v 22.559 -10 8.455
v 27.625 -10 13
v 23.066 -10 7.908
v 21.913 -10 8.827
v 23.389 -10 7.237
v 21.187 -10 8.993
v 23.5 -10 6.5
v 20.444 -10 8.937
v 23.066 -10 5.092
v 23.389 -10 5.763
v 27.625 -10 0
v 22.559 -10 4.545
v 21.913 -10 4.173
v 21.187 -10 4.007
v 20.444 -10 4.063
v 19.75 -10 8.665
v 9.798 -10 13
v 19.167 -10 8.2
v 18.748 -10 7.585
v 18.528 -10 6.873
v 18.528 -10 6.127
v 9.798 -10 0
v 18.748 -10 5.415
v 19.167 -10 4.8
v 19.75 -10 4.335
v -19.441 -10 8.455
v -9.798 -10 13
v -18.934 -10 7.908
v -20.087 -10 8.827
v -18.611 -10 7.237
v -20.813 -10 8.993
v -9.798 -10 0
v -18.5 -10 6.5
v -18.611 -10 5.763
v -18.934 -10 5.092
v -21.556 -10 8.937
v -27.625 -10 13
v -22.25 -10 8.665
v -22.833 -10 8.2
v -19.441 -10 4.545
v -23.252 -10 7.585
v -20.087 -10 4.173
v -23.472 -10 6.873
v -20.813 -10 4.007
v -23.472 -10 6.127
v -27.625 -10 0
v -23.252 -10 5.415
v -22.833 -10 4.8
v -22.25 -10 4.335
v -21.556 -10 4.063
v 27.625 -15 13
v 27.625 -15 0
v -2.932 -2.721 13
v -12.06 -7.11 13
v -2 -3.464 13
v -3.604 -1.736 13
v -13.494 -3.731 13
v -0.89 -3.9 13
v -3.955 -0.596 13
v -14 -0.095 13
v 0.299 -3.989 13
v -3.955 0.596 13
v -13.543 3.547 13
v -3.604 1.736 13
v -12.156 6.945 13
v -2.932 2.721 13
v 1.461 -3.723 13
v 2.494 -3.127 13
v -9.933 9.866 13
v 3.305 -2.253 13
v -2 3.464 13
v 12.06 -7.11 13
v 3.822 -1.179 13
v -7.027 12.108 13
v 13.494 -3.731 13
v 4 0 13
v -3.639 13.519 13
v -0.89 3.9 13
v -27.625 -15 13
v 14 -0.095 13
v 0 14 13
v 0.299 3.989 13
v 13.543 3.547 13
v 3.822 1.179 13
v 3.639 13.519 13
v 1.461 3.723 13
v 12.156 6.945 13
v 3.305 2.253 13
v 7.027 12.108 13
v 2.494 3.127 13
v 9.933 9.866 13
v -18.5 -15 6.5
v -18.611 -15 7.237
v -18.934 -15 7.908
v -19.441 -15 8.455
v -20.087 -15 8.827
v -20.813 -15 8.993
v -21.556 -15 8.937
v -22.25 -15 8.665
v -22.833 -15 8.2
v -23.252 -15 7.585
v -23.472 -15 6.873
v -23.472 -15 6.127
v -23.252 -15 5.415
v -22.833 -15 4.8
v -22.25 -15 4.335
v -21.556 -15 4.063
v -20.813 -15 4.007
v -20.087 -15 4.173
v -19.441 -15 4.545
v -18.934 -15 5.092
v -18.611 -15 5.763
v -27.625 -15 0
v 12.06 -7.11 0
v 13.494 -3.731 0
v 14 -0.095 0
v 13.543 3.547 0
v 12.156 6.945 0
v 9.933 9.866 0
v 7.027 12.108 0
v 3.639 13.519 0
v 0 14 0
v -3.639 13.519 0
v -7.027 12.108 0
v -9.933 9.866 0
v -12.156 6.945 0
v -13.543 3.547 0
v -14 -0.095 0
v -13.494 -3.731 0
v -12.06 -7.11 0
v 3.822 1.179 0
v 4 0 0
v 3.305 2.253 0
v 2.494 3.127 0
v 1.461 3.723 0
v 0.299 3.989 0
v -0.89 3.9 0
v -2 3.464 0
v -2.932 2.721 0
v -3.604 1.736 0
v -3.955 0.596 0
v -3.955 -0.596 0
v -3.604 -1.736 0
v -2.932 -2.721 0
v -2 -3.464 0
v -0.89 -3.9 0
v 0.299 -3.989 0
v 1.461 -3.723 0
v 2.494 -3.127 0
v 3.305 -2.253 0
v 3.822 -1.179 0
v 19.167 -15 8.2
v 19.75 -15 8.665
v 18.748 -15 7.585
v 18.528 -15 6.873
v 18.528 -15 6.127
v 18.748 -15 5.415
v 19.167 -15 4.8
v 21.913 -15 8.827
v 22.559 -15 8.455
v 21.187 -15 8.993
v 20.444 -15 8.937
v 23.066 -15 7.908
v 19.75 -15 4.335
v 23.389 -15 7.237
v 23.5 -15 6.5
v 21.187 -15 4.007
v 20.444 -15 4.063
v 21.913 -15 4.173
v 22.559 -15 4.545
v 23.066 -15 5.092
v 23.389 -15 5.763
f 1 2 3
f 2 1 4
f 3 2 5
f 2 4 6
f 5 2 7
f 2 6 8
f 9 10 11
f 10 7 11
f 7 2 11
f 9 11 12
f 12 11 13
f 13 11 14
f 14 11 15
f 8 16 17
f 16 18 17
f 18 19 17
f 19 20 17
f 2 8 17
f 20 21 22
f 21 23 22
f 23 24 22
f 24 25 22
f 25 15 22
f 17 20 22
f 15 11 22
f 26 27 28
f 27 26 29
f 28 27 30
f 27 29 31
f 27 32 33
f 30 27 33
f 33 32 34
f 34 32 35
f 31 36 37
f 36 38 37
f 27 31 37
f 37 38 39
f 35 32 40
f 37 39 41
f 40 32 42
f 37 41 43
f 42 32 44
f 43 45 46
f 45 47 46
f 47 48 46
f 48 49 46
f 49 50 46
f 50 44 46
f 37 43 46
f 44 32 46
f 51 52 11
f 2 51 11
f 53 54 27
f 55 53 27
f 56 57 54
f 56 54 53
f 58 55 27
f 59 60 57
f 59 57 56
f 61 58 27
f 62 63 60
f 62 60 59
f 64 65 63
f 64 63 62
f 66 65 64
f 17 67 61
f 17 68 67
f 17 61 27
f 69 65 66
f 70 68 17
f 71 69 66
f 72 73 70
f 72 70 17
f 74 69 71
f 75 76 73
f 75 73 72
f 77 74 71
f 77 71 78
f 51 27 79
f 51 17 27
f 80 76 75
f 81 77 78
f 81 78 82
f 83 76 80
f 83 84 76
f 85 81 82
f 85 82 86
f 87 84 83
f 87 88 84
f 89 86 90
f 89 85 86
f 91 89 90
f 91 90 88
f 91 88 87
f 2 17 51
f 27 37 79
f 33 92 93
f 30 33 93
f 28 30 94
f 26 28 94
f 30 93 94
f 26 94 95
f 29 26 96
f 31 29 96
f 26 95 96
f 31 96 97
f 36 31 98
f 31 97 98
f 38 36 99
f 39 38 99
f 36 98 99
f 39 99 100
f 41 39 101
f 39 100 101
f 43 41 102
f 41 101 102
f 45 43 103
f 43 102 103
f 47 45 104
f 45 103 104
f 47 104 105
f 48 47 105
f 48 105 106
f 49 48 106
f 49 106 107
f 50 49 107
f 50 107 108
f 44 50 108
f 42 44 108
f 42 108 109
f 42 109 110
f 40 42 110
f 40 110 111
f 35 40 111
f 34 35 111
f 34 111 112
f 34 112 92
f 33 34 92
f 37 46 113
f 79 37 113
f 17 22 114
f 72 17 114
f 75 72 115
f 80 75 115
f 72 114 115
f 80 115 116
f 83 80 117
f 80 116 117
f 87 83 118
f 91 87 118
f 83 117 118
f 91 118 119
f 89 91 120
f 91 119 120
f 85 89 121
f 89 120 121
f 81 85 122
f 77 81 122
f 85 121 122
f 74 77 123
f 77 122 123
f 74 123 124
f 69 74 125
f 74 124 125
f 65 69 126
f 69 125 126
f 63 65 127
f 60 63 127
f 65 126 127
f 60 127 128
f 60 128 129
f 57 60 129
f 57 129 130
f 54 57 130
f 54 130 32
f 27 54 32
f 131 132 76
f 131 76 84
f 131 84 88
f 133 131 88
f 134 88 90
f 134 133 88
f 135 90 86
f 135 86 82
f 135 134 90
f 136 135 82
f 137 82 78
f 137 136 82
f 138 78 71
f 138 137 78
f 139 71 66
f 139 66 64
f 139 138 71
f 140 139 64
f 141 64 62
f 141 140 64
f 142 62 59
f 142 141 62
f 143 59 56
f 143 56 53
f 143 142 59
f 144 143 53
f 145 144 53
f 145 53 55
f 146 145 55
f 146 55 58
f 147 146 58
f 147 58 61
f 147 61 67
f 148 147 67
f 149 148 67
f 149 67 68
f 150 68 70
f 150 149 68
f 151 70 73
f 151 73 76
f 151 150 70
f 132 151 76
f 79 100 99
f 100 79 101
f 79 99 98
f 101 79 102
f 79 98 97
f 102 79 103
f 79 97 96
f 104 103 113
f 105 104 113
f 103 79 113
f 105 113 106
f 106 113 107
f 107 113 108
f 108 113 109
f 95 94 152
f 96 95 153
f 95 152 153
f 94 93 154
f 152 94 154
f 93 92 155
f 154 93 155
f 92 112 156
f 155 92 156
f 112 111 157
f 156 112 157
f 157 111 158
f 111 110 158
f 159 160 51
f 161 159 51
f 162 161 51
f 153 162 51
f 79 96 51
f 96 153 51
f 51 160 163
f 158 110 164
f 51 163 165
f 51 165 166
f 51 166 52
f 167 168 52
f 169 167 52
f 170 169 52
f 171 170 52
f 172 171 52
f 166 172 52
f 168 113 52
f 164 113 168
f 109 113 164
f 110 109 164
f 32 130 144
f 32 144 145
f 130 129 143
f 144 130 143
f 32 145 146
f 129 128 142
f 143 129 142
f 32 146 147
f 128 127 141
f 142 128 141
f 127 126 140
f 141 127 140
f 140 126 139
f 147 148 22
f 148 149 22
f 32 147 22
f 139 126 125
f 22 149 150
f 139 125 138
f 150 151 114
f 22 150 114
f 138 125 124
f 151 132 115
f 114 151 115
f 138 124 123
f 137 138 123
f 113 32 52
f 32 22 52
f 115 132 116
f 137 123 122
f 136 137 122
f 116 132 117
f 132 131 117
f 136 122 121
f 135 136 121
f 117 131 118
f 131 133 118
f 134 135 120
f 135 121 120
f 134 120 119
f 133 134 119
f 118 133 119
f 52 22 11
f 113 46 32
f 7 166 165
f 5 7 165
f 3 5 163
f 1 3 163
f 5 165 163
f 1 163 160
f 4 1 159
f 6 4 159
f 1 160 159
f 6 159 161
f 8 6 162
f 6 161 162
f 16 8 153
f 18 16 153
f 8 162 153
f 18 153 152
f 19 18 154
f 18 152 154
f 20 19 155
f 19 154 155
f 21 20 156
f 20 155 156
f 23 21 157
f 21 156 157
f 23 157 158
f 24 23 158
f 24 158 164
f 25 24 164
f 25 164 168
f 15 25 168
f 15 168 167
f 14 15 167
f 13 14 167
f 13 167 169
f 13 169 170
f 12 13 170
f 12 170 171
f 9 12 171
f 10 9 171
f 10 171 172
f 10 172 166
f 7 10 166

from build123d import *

# Parameters (mm, degrees)
SKETCH1_R           = 4
BOSS_EXTRUDE1_DEPTH = 13
SKETCH2_R           = 2.5
CUT_EXTRUDE1_DEPTH  = 30


with BuildPart() as part:
    # Sketch1 → Boss-Extrude1 (new body)
    with BuildSketch(Plane.XY):
        with BuildLine():
            Line((-27.625, -15), (27.625, -15))
            Line((27.625, -15), (27.625, -10))
            Line((27.625, -10), (9.797958971, -10))
            ThreePointArc((9.797958971, -10), (0, 14), (-9.797958971, -10))
            Line((-9.797958971, -10), (-27.625, -10))
            Line((-27.625, -10), (-27.625, -15))
        make_face()
        Circle(SKETCH1_R, mode=Mode.SUBTRACT)
    extrude(amount=BOSS_EXTRUDE1_DEPTH)

    # Sketch2 → Cut-Extrude1 (cut, through all)
    with BuildSketch(Plane.XZ.offset(15)):
        with Locations((-21, 6.5)):
            Circle(SKETCH2_R)
        with Locations((21, 6.5)):
            Circle(SKETCH2_R)
    extrude(amount=-CUT_EXTRUDE1_DEPTH, mode=Mode.SUBTRACT)


solid = part.part
